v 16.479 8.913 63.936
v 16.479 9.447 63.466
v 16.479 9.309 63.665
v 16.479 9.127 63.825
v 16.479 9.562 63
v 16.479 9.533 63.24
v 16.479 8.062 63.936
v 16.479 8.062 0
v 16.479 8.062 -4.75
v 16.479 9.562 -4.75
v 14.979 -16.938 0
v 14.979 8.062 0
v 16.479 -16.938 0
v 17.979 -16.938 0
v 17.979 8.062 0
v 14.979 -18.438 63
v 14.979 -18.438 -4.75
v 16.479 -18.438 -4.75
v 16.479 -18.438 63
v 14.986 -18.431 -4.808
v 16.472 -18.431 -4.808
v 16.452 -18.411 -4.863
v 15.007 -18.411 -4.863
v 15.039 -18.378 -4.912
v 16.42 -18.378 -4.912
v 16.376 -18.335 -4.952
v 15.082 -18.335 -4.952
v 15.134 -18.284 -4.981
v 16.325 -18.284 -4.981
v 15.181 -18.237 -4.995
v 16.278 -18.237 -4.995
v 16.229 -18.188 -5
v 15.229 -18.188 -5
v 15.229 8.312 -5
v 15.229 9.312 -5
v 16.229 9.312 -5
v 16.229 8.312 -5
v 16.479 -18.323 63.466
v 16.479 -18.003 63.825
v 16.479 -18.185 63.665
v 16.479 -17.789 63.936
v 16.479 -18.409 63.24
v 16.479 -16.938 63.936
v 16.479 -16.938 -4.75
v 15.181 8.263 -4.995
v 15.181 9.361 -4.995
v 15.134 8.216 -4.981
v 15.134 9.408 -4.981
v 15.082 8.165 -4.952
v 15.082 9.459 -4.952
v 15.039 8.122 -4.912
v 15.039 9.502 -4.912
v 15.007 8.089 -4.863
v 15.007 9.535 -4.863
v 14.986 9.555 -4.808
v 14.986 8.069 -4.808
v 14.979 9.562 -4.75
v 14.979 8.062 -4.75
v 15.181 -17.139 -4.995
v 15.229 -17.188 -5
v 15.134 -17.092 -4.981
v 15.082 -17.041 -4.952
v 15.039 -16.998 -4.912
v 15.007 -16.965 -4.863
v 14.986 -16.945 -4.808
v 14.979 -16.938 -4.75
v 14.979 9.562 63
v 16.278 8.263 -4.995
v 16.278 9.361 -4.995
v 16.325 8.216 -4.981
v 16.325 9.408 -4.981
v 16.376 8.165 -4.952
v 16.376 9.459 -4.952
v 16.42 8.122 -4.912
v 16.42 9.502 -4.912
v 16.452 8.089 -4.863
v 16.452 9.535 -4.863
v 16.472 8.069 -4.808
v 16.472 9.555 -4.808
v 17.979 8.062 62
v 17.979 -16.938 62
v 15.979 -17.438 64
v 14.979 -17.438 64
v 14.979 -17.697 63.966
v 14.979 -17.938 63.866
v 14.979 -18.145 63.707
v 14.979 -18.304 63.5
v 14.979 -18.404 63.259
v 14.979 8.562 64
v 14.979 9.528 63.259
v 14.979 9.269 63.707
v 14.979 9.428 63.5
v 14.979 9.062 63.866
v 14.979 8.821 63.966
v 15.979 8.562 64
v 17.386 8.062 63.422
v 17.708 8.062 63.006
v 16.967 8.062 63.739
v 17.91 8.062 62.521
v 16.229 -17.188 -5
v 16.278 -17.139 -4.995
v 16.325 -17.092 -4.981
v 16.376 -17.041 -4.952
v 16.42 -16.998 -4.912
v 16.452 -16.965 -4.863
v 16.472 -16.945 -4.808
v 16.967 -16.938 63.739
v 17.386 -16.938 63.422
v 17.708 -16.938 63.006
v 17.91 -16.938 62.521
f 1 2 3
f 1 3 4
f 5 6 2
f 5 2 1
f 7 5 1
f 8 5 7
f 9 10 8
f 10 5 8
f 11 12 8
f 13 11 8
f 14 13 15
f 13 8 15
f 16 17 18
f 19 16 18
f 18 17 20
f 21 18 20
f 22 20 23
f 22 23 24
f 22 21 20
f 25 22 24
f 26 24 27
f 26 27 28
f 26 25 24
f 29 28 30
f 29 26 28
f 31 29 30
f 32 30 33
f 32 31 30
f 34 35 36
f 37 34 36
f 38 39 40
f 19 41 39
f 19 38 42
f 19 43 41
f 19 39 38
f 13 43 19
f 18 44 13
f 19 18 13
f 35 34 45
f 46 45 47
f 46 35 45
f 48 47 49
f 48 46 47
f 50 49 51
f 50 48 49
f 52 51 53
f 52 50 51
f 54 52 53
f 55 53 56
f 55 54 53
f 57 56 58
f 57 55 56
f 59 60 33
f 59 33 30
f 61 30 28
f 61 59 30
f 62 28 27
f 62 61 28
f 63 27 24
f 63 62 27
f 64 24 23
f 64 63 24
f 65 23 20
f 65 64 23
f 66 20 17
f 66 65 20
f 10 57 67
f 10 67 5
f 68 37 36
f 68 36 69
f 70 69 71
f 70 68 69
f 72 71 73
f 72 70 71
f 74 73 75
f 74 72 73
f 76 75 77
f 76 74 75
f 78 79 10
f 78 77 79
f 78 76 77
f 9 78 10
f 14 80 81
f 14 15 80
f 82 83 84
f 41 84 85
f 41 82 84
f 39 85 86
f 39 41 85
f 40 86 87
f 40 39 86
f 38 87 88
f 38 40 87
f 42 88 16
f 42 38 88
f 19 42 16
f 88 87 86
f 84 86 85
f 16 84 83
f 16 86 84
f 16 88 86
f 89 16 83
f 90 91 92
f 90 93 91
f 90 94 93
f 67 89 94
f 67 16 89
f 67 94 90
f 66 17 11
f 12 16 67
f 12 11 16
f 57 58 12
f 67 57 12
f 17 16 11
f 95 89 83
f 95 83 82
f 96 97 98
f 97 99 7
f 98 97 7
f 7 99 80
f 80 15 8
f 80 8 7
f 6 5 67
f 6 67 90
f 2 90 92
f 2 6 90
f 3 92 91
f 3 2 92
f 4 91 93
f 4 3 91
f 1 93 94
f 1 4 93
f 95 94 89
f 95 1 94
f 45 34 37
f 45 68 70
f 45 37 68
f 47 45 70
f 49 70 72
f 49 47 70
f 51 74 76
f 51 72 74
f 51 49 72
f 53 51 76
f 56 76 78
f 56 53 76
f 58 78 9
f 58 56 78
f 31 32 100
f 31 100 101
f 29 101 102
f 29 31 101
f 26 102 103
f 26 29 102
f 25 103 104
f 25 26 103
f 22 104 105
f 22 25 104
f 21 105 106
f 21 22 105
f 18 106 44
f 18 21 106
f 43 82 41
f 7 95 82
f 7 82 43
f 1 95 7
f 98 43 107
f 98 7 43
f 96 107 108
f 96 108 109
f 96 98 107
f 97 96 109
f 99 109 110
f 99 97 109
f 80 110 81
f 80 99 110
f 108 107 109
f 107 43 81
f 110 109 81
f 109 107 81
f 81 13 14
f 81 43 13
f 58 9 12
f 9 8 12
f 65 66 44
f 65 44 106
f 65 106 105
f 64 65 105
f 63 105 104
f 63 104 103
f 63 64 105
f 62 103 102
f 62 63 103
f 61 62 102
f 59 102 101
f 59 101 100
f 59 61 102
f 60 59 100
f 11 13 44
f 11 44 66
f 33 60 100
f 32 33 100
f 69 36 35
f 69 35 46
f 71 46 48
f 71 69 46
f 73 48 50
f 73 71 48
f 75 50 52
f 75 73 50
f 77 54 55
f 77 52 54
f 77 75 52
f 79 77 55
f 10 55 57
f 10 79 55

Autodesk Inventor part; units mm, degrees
ref_plane "YZ Plane" through (0, 0, 0) normal (1, 0, 0) x (0, 1, 0)
ref_plane "XZ Plane" through (0, 0, 0) normal (0, 1, 0) x (-1, 0, 0)
ref_plane "XY Plane" through (0, 0, 0) normal (0, 0, 1) x (1, 0, 0)
sketch "Sketch1" plane through (0, 0, 0) normal (0, 0, 1) x (1, 0, 0)
  line L0 (14.9794, -18.4381) -> (14.9794, 9.5619)
  line L1 (16.4794, -16.9381) -> (17.9794, -16.9381)
  line L2 (17.9794, 8.0619) -> (16.4794, 8.0619)
  line L3 (16.4794, 9.5619) -> (16.4794, 8.0619)
  line L4 (16.4794, -16.9381) -> (16.4794, -18.4381)
  line L5 (14.9794, 9.5619) -> (16.4794, 9.5619)
  line L6 (14.9794, -18.4381) -> (16.4794, -18.4381)
  line L7 (16.4794, -16.9381) -> (14.9794, -16.9381)
  line L8 (16.4794, 8.0619) -> (14.9794, 8.0619)
  line L9 (17.9794, 8.0619) -> (17.9794, -16.9381)
  dimension "d3" = 28
  dimension "d4" = 1.5
  dimension "d5" = 1.5
  dimension "d9" = 1.5
  dimension "d10" = 1.5
  dimension "d11" = 3
  dimension "d12" = 1.5
  dimension "d13" = 1.5
extrude "Extrusion1" add sketch "Sketch1" along normal blind 64
extrude "Extrusion2" add sketch "Sketch1" against normal blind 5 contours L0 L7 L4 L6 | L0 L5 L3 L8
fillet "Fillet1" radius 0.25 8 edges at (15.7294, 9.5619, -5) (16.4794, 8.8119, -5) (15.7294, 8.0619, -5) (14.9794, 8.8119, -5) (16.4794, -17.6881, -5) (15.7294, -16.9381, -5) (14.9794, -17.6881, -5) (15.7294, -18.4381, -5)
fillet "Fillet2" radius 1 2 edges at (15.7294, 9.5619, 64) (15.7294, -18.4381, 64)
fillet "Fillet3" radius 2 1 edges at (17.9794, -4.4381, 64)
properties part number "cover"
